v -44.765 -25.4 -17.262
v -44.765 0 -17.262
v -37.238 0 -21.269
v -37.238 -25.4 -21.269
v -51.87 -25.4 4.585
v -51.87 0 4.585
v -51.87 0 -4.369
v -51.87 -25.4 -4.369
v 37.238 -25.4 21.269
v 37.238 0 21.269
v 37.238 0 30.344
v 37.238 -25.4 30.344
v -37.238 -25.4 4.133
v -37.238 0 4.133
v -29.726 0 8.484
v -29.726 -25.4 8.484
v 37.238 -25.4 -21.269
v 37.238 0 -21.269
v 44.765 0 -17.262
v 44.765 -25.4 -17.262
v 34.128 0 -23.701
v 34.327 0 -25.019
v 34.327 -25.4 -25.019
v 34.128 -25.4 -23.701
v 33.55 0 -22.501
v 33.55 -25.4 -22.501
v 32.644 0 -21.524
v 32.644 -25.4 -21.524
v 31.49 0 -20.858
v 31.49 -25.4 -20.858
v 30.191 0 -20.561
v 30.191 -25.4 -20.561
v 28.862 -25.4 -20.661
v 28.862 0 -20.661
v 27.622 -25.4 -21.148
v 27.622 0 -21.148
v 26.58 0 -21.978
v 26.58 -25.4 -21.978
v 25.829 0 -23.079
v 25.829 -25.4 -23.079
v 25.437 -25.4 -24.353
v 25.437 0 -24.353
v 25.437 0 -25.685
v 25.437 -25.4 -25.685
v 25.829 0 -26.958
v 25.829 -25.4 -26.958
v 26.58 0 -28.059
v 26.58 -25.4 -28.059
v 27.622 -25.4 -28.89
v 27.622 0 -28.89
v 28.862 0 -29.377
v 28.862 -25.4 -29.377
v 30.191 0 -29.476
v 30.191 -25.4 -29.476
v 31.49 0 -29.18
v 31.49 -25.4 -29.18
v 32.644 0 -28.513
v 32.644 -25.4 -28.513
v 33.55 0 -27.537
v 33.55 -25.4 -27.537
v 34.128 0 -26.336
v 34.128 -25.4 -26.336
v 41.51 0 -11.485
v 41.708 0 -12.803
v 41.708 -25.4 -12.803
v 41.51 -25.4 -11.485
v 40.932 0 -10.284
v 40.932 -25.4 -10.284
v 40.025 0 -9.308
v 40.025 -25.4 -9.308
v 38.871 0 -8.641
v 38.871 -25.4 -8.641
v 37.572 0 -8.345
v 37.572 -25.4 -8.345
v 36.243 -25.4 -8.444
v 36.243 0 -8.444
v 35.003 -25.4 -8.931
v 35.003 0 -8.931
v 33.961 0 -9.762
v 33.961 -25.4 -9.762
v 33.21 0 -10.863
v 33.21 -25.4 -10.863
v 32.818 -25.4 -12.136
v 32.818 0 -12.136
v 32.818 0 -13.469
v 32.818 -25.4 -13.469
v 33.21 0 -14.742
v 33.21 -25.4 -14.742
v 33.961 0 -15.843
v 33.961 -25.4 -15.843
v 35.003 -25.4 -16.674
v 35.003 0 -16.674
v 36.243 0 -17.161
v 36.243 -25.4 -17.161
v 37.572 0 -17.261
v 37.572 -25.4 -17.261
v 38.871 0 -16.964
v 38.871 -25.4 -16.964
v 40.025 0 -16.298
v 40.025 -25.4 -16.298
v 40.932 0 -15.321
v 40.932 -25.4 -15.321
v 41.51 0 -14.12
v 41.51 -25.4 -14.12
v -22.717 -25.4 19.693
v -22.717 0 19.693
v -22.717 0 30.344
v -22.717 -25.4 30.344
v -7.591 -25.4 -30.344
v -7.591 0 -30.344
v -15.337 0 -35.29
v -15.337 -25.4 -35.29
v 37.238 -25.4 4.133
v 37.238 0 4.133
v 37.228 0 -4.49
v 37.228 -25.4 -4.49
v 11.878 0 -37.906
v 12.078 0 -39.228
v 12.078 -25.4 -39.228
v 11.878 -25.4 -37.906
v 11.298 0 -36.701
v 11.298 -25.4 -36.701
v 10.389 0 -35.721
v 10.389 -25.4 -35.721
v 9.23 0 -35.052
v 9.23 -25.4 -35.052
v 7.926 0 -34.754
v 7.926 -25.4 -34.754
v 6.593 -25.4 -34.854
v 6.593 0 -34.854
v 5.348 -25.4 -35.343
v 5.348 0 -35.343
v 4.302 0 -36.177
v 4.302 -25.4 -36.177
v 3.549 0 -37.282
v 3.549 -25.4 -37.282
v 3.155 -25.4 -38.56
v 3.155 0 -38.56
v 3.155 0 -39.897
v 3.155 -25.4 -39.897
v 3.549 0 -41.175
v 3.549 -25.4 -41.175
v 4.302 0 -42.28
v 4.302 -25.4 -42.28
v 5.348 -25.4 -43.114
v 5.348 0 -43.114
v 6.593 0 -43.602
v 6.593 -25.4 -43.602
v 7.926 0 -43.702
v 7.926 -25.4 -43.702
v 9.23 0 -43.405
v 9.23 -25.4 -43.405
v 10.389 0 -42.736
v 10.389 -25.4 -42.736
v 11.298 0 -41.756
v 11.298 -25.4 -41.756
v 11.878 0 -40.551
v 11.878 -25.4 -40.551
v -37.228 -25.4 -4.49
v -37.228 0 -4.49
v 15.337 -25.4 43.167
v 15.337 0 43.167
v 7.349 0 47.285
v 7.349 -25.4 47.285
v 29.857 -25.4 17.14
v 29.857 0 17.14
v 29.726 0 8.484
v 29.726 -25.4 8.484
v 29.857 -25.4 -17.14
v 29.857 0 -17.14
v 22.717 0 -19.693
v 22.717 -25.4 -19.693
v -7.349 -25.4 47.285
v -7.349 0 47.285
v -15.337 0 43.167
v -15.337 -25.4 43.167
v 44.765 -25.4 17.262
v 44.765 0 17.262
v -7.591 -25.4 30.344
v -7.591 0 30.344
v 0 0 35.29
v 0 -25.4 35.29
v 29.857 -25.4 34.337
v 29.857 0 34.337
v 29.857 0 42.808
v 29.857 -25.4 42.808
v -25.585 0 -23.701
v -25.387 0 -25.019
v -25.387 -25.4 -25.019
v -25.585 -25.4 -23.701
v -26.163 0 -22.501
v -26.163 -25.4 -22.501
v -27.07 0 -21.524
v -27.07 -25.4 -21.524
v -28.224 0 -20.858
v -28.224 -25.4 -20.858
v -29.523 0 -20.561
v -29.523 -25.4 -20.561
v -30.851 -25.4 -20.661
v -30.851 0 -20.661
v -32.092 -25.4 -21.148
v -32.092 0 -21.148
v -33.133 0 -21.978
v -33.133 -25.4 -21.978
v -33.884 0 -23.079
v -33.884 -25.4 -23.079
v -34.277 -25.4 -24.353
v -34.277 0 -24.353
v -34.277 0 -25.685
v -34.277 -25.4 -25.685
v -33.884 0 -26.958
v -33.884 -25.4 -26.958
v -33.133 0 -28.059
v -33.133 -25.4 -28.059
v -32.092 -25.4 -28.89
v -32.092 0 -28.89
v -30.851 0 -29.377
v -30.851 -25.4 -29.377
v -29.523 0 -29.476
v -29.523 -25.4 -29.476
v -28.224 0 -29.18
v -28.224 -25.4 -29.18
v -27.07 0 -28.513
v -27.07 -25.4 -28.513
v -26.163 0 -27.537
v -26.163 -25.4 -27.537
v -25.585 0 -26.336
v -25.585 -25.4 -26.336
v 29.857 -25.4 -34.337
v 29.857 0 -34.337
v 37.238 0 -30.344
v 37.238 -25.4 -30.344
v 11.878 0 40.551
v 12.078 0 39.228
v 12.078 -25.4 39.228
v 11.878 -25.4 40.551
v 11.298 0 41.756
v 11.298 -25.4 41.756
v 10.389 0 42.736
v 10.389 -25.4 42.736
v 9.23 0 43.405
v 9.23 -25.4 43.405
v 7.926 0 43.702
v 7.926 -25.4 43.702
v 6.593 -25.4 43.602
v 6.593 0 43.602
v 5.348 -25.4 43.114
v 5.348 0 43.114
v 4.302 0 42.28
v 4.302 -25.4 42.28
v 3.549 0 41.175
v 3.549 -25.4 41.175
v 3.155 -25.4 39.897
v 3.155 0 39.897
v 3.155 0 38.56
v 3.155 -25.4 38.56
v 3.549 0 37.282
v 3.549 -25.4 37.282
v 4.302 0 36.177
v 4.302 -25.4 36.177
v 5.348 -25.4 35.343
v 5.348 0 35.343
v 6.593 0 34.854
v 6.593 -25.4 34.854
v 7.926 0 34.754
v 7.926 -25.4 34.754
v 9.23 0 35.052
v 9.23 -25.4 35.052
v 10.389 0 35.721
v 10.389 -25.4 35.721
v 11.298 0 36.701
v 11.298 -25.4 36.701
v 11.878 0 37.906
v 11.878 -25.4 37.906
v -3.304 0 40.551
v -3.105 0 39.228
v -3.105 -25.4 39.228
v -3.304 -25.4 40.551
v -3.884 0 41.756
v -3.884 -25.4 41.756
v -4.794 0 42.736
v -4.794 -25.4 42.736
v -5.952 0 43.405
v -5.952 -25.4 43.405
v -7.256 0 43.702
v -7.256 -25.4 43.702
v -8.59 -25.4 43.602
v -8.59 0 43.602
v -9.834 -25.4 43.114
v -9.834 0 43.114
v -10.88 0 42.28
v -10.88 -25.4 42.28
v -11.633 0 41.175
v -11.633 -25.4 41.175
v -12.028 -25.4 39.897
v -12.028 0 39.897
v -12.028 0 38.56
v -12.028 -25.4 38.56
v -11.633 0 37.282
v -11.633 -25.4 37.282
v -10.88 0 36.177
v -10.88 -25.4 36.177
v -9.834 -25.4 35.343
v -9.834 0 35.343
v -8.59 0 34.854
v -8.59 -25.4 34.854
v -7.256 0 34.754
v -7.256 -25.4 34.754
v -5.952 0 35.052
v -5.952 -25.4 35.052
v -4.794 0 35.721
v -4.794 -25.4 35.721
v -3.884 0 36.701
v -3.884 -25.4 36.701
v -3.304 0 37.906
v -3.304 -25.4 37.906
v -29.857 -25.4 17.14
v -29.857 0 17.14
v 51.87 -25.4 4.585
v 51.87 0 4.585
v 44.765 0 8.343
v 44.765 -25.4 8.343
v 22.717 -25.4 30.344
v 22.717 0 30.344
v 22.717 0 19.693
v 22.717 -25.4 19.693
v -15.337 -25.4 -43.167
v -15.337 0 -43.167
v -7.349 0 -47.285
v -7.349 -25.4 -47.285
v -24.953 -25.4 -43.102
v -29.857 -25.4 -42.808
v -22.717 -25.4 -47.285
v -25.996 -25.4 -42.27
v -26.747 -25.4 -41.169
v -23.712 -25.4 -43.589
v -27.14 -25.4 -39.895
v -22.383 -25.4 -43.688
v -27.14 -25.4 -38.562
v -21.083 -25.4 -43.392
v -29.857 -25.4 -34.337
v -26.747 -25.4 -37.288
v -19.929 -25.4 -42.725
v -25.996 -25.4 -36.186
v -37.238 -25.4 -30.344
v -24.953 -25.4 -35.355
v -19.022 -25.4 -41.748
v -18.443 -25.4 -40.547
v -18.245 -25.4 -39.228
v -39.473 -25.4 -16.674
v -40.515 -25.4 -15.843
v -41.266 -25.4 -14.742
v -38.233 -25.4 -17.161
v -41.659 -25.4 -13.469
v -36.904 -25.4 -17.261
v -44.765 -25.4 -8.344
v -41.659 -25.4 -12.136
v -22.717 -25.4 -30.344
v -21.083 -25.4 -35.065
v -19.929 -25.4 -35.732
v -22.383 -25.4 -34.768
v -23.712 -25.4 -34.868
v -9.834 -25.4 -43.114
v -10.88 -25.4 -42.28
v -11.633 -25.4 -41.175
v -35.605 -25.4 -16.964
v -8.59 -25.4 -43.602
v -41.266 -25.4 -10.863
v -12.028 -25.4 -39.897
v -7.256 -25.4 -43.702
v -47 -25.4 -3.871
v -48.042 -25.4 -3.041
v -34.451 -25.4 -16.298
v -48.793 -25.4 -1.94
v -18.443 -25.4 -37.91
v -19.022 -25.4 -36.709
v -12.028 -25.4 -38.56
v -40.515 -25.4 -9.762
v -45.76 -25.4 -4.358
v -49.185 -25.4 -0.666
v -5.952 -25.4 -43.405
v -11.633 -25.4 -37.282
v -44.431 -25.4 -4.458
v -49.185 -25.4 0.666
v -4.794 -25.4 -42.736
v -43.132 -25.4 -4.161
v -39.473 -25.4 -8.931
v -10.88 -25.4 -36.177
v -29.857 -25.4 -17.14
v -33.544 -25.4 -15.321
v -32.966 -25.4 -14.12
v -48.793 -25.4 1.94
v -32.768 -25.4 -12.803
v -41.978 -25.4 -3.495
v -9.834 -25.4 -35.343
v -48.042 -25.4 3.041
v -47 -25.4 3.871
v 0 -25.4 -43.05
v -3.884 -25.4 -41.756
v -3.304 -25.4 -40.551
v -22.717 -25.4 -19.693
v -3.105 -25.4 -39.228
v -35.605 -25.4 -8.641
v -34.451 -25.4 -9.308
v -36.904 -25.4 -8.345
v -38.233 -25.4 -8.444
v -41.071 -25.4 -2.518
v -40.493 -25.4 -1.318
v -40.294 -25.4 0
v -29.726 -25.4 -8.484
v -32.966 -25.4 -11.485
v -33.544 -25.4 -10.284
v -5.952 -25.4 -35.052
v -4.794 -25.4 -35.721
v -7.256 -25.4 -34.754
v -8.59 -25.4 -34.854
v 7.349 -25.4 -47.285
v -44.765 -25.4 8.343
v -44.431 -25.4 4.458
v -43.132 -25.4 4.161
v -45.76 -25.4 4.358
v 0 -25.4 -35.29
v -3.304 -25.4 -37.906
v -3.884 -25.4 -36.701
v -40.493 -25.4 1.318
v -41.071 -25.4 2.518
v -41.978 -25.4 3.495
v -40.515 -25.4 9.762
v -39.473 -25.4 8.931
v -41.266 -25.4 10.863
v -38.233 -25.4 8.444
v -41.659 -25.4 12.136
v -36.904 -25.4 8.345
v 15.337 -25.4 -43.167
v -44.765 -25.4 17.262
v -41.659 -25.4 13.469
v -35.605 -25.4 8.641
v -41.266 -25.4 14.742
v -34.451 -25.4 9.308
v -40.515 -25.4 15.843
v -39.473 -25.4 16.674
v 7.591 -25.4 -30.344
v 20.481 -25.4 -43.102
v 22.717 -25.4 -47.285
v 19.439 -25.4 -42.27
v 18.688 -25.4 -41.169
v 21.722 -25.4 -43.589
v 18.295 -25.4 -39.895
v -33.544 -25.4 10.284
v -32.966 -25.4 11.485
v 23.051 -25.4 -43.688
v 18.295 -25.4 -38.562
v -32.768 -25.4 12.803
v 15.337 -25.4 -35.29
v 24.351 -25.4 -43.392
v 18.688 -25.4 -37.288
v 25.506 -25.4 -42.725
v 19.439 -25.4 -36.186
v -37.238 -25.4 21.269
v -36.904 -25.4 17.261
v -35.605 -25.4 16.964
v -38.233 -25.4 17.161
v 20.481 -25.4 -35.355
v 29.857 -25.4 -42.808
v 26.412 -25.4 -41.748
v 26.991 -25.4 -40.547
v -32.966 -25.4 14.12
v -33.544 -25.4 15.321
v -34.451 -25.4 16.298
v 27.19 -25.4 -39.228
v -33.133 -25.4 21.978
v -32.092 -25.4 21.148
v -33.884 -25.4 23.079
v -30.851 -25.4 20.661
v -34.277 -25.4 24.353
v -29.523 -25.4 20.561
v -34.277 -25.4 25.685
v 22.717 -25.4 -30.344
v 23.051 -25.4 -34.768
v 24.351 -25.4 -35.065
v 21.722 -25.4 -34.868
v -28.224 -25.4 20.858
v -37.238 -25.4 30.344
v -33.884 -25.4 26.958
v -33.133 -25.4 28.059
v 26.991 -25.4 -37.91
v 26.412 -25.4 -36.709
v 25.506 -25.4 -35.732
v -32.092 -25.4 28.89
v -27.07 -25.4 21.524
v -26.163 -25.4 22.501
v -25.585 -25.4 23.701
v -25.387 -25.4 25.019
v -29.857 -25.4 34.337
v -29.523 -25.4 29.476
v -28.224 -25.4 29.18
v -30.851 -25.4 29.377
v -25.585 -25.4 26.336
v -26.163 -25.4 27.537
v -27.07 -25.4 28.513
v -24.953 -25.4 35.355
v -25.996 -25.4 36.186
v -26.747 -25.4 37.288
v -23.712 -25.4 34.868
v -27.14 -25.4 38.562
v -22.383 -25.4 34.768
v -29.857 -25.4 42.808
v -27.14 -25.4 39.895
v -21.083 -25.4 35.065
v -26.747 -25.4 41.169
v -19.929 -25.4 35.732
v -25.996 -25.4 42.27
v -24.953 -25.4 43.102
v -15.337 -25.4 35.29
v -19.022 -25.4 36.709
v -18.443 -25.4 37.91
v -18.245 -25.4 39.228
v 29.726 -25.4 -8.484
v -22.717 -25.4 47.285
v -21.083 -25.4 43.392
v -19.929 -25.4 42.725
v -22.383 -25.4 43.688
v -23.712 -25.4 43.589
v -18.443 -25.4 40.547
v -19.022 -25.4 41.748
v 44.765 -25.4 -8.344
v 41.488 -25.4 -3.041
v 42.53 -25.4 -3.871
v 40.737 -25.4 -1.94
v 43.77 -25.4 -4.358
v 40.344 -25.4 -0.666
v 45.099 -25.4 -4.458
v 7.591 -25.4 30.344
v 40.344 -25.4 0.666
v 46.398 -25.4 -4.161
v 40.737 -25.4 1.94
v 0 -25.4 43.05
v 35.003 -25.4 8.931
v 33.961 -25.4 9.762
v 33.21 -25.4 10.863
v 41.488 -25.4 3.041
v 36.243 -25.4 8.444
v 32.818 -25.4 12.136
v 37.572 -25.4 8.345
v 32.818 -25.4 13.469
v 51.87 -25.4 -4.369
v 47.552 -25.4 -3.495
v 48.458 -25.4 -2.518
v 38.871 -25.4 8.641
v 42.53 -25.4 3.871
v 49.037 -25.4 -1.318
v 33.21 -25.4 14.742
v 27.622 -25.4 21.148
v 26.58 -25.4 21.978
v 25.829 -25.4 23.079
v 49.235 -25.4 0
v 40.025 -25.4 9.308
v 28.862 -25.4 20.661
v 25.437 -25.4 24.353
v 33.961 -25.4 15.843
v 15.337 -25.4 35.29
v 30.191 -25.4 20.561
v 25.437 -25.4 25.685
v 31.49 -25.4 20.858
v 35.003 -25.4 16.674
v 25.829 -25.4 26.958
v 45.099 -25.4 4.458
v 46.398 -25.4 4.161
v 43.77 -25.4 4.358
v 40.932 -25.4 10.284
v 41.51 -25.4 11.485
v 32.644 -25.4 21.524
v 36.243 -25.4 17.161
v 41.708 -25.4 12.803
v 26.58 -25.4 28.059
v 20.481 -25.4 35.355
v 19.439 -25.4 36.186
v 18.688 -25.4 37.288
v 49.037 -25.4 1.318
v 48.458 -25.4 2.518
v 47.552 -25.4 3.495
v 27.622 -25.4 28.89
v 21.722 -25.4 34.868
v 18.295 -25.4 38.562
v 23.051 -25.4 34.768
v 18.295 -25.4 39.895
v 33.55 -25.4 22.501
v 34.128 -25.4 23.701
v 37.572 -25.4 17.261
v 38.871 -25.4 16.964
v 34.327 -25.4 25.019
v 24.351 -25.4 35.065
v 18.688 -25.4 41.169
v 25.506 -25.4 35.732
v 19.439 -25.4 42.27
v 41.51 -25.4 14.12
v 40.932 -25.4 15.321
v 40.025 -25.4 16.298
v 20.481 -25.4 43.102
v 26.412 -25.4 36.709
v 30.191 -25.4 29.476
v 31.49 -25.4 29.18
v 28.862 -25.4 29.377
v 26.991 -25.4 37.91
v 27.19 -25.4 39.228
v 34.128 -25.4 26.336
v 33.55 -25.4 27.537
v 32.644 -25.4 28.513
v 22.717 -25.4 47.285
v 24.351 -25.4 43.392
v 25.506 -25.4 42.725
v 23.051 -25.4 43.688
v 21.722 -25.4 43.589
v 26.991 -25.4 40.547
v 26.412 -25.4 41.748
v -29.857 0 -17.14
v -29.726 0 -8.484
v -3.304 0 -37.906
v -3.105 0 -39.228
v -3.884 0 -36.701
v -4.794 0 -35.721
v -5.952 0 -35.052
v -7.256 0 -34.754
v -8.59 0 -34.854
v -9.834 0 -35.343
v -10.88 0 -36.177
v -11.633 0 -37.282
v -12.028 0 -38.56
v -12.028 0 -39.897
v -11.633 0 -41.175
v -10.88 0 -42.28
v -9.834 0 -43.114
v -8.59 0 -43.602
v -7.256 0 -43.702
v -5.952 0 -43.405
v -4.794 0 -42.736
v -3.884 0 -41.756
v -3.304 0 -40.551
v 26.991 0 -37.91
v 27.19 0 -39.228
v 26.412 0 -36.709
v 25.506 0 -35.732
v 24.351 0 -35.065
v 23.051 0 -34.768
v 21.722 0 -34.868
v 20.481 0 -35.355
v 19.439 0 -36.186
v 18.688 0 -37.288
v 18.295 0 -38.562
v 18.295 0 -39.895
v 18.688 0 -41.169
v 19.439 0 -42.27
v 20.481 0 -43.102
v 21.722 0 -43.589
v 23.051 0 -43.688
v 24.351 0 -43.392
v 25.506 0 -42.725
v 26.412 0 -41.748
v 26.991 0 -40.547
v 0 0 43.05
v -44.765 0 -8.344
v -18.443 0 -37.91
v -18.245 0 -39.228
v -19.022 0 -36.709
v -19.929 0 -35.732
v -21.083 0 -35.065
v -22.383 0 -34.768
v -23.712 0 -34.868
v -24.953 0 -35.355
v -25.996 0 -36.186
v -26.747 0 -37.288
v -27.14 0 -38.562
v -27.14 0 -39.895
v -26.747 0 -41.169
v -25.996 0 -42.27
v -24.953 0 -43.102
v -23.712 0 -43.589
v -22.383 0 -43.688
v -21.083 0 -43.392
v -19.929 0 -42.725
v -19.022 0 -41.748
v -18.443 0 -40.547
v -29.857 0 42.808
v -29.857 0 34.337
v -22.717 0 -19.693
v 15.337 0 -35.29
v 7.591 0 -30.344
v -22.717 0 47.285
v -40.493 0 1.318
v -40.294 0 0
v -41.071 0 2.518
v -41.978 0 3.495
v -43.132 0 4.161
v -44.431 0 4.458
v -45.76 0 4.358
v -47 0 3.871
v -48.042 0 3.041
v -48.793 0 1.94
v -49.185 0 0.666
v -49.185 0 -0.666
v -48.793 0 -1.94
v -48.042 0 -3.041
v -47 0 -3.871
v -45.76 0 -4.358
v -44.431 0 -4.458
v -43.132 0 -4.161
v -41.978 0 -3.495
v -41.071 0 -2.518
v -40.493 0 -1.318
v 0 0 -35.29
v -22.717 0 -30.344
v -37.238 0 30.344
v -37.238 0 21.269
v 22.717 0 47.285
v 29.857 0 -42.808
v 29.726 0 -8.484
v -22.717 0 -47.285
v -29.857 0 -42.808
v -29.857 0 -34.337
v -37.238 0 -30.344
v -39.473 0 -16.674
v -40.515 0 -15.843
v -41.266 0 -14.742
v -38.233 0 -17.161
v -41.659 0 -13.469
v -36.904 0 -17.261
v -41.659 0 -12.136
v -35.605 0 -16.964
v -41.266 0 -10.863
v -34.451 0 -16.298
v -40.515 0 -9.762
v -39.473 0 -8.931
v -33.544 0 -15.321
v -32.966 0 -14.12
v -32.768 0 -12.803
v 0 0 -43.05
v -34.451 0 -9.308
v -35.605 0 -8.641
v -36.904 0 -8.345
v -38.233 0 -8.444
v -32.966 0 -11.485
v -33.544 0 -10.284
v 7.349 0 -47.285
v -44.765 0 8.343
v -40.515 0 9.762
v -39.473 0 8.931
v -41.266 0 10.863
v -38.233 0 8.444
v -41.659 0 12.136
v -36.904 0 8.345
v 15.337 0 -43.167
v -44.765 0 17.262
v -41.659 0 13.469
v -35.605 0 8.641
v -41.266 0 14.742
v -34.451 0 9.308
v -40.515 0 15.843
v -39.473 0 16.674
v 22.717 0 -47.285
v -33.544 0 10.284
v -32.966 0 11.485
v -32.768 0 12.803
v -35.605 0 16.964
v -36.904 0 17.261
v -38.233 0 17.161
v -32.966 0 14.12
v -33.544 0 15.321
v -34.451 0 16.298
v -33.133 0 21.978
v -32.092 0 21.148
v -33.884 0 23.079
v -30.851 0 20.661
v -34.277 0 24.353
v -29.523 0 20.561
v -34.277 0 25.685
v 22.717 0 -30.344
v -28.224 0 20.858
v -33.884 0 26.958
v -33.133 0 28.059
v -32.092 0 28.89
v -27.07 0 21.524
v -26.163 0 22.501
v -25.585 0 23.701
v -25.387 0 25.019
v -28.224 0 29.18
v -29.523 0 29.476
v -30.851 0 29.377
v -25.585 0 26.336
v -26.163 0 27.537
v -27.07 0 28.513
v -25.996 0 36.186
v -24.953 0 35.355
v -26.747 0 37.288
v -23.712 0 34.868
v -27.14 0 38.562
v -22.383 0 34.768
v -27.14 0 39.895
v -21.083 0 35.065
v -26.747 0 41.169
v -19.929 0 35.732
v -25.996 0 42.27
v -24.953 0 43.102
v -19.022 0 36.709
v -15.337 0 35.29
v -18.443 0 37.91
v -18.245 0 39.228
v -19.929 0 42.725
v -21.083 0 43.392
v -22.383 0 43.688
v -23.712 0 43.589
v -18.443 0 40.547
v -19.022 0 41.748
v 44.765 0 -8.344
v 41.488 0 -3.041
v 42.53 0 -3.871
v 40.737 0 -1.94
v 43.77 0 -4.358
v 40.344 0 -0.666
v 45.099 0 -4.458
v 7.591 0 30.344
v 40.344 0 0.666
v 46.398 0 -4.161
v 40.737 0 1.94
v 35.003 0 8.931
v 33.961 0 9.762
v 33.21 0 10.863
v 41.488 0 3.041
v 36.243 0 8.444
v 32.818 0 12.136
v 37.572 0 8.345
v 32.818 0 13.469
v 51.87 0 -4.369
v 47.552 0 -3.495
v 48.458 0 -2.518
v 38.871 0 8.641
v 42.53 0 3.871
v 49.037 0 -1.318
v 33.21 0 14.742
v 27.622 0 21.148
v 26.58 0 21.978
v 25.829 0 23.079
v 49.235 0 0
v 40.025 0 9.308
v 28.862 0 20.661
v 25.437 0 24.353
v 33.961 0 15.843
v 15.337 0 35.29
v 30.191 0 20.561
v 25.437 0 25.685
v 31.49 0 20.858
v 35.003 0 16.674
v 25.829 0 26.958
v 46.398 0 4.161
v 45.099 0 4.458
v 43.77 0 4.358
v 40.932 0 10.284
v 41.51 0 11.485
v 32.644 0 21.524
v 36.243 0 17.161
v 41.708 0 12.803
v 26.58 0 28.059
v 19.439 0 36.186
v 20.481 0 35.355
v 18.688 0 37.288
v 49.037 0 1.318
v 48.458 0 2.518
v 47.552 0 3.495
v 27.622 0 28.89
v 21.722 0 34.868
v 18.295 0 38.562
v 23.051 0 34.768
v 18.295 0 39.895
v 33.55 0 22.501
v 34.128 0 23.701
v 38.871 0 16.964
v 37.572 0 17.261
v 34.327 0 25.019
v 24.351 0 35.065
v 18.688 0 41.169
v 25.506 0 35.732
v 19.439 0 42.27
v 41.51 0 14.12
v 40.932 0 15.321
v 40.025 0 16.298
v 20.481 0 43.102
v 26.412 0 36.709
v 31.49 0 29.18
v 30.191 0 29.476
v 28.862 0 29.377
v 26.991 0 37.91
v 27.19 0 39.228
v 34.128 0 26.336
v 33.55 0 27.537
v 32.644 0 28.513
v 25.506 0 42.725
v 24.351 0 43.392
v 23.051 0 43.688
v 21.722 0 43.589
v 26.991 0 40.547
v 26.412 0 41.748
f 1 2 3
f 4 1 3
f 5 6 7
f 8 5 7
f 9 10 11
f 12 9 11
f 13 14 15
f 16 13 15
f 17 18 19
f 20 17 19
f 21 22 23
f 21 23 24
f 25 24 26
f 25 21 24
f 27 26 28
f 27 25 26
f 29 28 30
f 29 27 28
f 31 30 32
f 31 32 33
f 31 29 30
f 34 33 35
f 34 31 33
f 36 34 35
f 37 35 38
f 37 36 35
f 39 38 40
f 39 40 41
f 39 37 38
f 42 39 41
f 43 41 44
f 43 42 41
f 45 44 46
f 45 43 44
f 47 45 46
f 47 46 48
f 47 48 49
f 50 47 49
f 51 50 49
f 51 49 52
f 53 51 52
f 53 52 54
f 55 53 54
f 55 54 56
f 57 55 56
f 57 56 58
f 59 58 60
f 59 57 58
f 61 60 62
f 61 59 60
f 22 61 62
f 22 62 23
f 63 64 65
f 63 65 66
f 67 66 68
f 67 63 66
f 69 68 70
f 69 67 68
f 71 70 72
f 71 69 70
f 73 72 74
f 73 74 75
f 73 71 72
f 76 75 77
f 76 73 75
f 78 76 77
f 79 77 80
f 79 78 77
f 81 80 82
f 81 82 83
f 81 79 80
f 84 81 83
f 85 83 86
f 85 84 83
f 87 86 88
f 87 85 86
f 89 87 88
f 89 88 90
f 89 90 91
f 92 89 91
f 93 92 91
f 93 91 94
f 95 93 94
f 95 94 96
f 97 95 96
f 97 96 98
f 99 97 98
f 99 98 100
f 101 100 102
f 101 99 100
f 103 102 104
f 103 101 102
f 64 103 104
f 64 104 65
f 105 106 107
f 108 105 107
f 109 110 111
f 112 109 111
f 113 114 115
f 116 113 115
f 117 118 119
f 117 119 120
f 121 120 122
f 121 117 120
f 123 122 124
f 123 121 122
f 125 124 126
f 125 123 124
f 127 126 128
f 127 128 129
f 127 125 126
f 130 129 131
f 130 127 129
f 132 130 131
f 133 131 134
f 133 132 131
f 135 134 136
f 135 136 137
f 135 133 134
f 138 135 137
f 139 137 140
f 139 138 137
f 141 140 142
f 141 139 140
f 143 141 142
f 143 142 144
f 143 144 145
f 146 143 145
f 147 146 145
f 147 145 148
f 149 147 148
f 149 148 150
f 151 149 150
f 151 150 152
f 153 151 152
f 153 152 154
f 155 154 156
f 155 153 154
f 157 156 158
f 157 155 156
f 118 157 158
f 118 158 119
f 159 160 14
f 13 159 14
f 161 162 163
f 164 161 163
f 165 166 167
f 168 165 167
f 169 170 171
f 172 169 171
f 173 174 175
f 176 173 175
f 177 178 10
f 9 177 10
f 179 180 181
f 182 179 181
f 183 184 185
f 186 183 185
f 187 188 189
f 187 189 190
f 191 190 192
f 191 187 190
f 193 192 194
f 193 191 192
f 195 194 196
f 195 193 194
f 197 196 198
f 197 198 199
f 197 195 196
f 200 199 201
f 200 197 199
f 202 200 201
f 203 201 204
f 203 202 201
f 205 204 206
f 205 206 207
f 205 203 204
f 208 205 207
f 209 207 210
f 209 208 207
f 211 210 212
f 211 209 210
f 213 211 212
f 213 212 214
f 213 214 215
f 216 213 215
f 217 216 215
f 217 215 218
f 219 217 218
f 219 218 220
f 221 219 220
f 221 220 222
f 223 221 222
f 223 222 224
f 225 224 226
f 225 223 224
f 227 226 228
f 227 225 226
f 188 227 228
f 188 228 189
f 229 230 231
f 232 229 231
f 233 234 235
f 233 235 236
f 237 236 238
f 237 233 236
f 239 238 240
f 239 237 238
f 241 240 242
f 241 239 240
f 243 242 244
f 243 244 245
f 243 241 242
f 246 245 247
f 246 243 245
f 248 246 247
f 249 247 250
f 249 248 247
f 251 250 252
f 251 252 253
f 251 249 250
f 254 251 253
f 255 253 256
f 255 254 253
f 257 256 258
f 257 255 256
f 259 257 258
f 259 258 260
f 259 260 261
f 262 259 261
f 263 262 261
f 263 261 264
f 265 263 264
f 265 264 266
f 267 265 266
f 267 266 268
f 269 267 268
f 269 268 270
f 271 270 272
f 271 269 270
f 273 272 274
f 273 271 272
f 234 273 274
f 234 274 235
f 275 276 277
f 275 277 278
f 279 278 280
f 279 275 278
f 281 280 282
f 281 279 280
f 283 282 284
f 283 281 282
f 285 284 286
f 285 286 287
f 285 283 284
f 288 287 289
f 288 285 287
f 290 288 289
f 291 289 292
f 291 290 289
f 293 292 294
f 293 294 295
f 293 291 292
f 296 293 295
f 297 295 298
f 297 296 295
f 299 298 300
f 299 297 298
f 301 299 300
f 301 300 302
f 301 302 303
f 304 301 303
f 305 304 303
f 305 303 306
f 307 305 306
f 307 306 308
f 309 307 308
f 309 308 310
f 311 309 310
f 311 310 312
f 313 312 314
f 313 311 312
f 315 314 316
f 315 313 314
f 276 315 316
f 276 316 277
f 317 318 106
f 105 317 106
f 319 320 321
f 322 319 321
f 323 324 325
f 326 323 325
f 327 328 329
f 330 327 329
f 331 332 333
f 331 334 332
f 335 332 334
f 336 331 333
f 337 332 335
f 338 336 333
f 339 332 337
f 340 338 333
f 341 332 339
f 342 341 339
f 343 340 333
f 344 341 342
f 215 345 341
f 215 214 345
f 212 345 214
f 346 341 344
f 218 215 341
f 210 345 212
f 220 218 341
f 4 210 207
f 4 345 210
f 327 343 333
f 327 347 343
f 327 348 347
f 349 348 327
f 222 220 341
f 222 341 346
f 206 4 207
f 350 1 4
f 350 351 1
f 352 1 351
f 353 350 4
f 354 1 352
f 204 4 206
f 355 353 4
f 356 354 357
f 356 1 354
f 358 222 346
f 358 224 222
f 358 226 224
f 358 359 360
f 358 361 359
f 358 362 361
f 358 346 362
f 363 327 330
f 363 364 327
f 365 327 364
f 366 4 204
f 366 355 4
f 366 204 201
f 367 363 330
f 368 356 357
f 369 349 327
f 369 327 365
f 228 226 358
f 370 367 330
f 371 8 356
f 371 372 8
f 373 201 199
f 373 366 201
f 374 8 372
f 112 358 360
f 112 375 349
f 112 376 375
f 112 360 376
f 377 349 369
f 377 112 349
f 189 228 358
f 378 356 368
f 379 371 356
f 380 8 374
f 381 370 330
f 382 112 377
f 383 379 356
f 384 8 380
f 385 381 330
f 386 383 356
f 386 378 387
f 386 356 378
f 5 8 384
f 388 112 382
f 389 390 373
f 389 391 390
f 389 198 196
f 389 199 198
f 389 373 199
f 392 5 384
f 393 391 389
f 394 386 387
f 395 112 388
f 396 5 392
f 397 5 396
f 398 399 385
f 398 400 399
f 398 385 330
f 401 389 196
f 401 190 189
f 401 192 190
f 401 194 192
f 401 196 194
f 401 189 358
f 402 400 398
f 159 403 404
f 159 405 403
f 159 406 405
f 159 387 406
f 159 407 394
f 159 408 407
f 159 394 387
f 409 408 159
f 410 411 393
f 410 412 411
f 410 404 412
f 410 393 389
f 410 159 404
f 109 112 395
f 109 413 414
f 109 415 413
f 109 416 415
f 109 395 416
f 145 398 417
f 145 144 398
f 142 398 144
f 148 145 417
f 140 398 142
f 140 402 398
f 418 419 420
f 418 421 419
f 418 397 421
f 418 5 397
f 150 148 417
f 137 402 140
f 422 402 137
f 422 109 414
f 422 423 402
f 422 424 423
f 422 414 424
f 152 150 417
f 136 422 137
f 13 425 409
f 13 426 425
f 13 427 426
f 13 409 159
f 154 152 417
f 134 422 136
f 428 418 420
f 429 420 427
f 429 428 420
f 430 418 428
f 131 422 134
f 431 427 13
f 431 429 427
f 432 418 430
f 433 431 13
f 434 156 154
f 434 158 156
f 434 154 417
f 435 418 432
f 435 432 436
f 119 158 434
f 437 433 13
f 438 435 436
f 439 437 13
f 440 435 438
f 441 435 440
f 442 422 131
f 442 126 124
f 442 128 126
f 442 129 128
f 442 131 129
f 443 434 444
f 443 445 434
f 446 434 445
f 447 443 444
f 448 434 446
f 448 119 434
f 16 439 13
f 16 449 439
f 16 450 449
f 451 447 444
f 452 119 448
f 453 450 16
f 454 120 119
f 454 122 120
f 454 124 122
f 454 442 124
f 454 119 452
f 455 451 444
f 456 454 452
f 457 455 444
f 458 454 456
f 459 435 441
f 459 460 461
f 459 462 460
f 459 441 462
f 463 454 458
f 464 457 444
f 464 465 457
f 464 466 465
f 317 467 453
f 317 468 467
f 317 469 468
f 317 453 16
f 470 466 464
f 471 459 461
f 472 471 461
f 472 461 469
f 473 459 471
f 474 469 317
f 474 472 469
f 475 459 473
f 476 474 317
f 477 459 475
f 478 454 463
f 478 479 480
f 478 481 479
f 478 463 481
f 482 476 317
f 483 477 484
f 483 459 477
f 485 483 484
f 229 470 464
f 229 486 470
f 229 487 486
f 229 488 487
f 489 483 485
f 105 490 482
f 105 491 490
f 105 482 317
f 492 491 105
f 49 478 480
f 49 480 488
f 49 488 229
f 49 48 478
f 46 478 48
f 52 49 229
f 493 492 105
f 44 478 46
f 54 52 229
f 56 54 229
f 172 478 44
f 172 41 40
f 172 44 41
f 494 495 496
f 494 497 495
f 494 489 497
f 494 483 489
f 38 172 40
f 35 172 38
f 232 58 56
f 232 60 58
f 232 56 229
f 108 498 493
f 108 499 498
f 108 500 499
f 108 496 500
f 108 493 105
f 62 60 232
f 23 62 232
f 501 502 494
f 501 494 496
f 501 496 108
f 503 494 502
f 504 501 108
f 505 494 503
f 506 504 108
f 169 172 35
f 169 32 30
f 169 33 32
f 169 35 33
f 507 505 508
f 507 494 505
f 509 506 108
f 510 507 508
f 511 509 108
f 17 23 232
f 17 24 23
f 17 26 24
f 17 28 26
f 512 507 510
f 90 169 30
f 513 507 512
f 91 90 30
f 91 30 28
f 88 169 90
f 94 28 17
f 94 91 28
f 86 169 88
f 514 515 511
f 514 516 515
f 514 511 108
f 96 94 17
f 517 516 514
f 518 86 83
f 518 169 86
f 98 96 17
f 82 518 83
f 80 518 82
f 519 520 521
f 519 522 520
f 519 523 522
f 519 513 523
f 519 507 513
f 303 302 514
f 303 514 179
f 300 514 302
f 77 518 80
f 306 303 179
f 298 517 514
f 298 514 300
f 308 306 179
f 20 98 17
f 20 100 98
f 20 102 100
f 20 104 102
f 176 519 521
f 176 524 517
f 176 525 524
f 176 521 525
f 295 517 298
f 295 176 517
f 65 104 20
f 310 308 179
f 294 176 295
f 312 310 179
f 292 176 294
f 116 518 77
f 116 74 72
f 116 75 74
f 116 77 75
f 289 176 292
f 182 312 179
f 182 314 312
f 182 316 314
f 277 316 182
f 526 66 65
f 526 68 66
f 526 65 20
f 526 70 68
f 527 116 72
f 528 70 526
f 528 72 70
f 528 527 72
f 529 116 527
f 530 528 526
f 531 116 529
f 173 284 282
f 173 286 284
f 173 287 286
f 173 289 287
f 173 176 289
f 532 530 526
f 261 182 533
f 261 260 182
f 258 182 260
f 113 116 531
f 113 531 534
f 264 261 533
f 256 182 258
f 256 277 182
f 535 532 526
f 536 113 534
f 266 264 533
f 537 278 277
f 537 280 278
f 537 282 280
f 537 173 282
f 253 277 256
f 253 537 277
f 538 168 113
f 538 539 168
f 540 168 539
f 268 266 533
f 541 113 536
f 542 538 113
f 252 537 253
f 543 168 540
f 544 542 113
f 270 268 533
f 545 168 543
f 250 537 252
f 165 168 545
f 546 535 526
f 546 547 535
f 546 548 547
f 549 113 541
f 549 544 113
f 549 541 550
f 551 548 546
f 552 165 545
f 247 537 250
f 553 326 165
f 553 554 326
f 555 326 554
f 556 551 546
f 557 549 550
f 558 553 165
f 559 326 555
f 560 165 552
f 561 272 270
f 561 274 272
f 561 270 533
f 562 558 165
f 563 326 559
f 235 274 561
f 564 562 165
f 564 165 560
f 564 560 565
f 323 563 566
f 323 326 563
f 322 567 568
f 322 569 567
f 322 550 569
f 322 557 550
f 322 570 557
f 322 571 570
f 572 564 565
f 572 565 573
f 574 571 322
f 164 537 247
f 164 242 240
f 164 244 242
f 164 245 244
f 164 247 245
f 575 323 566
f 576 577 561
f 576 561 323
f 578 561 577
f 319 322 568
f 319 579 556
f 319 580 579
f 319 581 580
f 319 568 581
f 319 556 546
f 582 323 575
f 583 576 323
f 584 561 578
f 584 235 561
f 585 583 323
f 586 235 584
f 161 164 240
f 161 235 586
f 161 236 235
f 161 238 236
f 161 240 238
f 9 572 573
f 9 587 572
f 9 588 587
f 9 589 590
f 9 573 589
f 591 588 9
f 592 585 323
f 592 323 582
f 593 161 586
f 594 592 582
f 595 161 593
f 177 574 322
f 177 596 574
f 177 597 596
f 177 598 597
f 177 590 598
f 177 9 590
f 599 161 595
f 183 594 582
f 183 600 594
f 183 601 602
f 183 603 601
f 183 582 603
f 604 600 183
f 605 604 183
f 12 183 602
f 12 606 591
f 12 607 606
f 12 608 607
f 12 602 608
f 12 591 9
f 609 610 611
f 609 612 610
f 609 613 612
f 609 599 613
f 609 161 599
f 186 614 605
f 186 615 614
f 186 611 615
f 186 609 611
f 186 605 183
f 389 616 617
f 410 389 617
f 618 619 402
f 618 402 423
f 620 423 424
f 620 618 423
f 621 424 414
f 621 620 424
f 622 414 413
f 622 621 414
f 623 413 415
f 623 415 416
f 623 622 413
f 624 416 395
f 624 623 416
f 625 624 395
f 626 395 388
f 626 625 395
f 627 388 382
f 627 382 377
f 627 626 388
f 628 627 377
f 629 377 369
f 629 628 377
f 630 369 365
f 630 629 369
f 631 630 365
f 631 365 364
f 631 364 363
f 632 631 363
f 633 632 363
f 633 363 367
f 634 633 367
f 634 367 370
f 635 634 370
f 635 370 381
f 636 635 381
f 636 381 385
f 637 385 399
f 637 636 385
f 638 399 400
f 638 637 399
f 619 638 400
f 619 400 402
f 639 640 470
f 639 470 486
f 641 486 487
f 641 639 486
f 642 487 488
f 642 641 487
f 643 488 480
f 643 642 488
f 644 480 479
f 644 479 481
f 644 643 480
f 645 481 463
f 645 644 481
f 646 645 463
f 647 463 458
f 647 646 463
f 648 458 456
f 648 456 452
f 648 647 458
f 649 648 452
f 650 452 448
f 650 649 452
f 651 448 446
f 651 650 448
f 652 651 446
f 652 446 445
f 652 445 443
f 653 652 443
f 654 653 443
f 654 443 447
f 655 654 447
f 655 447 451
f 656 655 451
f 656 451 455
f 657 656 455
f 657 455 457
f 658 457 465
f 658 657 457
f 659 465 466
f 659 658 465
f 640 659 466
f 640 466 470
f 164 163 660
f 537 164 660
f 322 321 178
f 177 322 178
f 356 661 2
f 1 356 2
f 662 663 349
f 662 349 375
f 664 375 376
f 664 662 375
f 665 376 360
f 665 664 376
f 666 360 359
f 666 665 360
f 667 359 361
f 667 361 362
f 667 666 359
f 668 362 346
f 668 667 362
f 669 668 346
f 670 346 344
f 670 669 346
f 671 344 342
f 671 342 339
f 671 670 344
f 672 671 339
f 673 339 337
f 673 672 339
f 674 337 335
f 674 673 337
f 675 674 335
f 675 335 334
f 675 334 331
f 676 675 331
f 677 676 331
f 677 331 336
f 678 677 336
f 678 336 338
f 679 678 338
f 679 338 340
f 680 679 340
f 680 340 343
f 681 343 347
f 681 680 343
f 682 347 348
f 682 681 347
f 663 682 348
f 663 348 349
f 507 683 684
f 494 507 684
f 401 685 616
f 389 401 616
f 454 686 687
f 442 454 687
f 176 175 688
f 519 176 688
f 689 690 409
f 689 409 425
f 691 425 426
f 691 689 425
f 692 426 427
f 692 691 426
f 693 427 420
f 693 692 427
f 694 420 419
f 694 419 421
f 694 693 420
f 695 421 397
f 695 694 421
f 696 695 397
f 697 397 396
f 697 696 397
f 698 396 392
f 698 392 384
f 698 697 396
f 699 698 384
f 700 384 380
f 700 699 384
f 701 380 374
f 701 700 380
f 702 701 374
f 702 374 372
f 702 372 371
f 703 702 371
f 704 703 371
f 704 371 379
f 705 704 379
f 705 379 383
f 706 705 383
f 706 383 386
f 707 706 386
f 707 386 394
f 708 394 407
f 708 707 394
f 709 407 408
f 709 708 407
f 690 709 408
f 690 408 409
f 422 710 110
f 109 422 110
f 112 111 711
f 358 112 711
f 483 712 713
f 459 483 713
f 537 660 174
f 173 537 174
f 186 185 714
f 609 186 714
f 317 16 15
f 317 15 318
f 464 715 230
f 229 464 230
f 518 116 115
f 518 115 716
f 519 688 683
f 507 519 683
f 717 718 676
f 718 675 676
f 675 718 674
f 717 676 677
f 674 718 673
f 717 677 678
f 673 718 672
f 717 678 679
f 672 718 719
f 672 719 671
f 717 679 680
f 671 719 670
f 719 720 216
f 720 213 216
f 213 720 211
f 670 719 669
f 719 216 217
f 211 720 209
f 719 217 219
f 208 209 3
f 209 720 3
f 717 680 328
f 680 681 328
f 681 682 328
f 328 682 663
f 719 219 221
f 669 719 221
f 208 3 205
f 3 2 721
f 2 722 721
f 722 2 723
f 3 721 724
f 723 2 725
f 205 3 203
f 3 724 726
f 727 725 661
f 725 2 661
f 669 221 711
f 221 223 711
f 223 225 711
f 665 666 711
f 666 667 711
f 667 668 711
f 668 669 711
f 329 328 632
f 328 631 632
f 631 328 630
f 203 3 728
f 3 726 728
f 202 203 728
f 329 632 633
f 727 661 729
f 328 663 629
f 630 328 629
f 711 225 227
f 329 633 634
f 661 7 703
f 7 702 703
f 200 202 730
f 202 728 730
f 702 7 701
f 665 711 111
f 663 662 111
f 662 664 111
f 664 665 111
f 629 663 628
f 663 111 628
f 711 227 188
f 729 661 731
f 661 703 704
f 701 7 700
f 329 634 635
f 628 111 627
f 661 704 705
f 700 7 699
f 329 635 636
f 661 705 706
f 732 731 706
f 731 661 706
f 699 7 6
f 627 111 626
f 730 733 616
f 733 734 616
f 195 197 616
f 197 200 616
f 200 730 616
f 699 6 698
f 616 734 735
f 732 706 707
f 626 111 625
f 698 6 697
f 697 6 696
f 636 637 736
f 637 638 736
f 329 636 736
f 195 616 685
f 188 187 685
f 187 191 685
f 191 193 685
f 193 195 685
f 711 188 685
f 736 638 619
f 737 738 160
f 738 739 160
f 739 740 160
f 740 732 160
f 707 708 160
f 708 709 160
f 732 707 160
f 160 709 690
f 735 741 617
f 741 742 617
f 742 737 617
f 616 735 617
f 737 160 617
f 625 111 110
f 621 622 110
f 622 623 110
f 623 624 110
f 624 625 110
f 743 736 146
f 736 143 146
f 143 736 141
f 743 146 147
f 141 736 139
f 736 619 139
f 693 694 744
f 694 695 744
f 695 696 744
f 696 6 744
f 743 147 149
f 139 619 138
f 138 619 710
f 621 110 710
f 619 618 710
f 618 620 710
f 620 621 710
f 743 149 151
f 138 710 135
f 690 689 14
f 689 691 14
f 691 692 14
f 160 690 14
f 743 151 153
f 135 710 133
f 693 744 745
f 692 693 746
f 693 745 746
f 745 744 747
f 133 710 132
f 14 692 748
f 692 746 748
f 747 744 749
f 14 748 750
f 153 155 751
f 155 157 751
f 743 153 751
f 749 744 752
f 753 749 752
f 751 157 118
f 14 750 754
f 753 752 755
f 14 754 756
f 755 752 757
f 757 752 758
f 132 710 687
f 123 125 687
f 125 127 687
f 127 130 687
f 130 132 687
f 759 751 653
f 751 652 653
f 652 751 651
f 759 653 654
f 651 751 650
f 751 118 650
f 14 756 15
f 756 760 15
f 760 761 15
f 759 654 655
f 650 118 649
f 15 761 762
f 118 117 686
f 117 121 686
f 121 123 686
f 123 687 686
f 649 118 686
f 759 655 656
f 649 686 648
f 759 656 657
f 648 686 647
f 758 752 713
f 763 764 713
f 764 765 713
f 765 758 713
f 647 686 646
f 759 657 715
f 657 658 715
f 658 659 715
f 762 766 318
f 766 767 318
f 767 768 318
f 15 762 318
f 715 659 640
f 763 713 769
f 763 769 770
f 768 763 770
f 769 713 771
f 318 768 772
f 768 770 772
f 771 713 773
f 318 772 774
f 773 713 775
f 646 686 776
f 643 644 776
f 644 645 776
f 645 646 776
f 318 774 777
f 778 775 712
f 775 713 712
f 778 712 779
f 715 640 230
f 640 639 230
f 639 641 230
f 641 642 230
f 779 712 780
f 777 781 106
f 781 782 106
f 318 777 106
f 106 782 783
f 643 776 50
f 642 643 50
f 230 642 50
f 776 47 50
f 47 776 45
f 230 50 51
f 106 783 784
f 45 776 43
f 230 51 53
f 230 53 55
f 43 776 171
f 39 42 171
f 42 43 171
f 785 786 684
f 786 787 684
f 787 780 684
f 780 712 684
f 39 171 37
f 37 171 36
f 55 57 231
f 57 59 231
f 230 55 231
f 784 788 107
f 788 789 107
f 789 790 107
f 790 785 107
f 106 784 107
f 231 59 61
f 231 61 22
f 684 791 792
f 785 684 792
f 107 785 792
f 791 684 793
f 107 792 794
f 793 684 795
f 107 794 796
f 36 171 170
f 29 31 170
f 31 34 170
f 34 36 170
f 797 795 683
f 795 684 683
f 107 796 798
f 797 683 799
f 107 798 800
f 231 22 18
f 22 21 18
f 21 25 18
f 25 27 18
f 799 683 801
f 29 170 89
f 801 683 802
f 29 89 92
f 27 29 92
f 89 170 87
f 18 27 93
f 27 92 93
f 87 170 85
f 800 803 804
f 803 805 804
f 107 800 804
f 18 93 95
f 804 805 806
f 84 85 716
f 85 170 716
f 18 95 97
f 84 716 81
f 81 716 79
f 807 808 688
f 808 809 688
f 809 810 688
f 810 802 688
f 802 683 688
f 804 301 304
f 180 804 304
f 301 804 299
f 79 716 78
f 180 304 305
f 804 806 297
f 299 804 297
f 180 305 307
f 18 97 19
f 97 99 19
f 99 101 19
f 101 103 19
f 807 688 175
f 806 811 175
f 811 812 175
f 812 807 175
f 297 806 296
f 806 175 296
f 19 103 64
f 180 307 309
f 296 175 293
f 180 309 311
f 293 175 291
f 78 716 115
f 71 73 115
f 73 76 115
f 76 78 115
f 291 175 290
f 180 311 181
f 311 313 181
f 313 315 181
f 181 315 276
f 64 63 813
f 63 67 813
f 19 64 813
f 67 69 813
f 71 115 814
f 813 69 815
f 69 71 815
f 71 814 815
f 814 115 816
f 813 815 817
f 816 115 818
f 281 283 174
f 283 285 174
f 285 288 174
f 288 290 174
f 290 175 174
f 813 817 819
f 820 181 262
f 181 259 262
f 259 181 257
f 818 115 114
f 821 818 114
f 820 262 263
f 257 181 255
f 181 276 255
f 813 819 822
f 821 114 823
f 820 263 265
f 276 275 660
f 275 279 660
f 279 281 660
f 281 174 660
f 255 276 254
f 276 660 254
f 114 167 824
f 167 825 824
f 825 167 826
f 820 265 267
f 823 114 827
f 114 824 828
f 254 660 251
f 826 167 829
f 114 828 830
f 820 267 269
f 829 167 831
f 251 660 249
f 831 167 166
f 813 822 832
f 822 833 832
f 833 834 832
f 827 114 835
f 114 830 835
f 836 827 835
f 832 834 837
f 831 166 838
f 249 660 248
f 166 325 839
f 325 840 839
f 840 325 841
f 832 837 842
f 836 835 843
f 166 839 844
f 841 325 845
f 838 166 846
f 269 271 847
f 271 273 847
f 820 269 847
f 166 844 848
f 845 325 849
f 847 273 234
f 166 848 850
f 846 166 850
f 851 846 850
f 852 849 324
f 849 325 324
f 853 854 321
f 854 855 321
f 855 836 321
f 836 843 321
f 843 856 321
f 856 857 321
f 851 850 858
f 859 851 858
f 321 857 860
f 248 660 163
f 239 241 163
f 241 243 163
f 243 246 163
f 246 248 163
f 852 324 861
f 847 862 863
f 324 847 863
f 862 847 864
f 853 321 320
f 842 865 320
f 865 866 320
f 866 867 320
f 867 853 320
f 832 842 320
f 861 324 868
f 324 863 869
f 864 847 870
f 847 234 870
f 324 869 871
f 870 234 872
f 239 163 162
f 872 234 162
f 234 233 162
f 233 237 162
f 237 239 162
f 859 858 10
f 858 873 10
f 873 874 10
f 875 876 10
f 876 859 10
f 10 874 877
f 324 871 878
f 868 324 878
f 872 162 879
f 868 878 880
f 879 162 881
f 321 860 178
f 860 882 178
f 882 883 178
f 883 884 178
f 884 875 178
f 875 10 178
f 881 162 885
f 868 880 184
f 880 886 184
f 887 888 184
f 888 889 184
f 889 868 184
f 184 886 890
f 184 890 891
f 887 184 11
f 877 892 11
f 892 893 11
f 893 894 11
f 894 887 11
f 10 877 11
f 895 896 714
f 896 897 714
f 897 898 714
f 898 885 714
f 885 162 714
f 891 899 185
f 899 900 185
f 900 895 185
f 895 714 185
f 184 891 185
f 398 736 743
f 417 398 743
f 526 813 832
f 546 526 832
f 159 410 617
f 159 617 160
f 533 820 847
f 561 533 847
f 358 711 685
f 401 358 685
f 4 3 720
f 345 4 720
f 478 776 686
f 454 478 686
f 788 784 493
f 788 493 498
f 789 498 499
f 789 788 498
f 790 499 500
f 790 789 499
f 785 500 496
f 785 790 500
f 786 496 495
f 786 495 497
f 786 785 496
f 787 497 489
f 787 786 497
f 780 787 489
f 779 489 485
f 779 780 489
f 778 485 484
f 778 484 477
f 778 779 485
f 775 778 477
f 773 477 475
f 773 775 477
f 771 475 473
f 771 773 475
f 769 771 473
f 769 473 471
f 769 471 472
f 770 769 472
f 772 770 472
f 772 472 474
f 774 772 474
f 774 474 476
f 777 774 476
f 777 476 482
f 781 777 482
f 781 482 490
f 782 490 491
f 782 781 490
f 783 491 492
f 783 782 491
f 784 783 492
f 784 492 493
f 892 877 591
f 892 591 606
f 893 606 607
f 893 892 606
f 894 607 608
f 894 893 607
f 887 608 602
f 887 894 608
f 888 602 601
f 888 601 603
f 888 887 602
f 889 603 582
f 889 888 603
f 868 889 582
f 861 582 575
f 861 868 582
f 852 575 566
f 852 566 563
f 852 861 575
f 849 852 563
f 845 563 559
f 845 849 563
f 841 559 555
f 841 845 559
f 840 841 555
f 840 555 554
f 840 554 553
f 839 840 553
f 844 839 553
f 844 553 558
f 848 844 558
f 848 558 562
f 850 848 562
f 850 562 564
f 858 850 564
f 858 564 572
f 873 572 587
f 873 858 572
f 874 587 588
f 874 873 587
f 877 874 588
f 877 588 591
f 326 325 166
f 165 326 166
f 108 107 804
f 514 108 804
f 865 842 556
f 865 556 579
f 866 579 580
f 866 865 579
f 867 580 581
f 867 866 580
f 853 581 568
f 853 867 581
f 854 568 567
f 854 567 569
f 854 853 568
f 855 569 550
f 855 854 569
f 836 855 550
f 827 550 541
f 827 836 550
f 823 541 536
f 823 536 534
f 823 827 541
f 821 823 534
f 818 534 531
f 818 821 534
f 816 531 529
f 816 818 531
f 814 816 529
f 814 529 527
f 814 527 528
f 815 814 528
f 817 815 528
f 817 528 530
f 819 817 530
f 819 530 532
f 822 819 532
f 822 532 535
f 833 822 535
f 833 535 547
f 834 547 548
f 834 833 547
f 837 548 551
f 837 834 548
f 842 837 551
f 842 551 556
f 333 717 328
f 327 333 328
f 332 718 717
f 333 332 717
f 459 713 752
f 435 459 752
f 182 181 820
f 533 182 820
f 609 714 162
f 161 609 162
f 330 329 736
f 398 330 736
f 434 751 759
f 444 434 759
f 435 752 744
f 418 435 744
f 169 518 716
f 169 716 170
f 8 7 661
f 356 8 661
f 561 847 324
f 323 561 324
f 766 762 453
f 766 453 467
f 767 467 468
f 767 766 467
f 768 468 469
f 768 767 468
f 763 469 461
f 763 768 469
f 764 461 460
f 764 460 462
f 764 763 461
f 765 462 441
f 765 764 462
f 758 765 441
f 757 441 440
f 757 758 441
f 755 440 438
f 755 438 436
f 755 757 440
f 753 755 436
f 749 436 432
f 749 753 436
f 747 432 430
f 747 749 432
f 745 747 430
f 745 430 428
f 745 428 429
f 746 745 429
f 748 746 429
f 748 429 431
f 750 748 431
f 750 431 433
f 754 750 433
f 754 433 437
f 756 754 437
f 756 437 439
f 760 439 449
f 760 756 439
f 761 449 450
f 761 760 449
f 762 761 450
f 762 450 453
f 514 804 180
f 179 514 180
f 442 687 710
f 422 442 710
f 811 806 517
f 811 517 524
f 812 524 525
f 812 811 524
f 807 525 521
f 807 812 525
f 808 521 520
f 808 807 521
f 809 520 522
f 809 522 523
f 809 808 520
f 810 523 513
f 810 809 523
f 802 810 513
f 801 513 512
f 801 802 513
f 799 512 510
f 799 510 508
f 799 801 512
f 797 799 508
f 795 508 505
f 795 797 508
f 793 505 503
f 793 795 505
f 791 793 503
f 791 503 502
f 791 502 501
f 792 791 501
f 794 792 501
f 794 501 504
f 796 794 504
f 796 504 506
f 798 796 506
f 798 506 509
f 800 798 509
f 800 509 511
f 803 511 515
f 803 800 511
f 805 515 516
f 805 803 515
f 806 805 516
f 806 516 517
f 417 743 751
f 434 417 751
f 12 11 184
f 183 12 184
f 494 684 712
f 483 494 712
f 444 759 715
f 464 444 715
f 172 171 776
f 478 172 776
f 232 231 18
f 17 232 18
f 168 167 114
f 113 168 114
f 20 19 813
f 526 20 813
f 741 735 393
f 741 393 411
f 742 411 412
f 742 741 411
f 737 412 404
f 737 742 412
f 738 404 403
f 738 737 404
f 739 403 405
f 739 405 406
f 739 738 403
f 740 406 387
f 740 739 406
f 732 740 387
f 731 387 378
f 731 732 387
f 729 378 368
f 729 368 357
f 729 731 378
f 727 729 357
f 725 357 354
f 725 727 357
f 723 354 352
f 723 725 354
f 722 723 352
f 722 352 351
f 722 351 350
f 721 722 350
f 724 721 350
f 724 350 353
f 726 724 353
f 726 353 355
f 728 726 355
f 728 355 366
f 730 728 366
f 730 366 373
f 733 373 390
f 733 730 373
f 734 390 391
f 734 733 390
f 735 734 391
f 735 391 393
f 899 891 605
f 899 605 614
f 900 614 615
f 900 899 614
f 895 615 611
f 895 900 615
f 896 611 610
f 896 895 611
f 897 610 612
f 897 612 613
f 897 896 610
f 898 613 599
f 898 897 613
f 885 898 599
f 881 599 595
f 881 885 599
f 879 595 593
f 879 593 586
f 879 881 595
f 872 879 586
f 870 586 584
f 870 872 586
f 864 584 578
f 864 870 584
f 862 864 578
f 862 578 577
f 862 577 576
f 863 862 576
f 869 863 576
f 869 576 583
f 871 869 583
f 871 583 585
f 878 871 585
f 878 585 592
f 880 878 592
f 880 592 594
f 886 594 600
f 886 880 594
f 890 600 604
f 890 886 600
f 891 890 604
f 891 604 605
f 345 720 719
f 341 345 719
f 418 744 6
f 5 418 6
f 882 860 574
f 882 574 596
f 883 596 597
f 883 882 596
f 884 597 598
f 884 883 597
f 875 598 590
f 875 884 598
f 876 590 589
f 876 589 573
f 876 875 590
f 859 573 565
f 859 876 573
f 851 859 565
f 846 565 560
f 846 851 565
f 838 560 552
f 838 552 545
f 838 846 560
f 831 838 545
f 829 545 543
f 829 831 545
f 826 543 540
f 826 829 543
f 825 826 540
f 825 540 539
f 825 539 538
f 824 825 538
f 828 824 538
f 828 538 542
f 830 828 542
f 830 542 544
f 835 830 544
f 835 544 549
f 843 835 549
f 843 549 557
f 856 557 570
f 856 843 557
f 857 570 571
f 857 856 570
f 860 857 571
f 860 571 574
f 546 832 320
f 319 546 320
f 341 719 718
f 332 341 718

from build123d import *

# Parameters (mm, degrees)
F0_R     = 4.4723953016
F0_R_2   = 4.4699433495
F0_R_3   = 4.4865038471
F0_R_4   = 4.4704
F1_DEPTH = 25.4


with BuildPart() as f1:
    # F0 (on Front) → F1 (new body)
    with BuildSketch(Plane.XZ):
        Polygon((-29.8565831035, 42.8078435361), (-29.8565831035, 34.337323159), (-22.7171443403, 30.3440783173), (-15.336762752, 35.2895531338), (-15.336762752, 43.1670817552), (-22.7171443403, 47.285117209), align=None)
        with Locations((-22.7171443403, 39.2283174445)):
            Circle(F0_R, mode=Mode.SUBTRACT)
        Polygon((-22.7171443403, 30.3440783173), (-29.8565831035, 34.337323159), (-37.238035351, 30.3440783173), (-37.238035351, 21.2685223682), (-29.8565831035, 17.1399140715), (-22.7171443403, 19.6934139464), align=None)
        with Locations((-29.8565831035, 25.0187461318)):
            Circle(F0_R_2, mode=Mode.SUBTRACT)
        Polygon((-15.336762752, 43.1670817552), (-15.336762752, 35.2895531338), (-7.5912186876, 30.3440783173), (0, 35.2895531338), (0, 43.0498570204), (-7.3492033407, 47.285117209), align=None)
        with Locations((-7.5912186876, 39.2283174445)):
            Circle(F0_R_3, mode=Mode.SUBTRACT)
        Polygon((-29.8565831035, 17.1399140715), (-37.238035351, 21.2685223682), (-44.7648577392, 17.2623099094), (-44.7648577392, 8.3431052044), (-37.238035351, 4.1331881966), (-29.7259818762, 8.483578451), align=None)
        with Locations((-37.238035351, 12.8027075569)):
            Circle(F0_R_4, mode=Mode.SUBTRACT)
        Polygon((0, 43.0498570204), (0, 35.2895531338), (7.5912186876, 30.3440783173), (15.336762752, 35.2895531338), (15.336762752, 43.1670817552), (7.3492033407, 47.285117209), align=None)
        with Locations((7.5912186876, 39.2283174445)):
            Circle(F0_R_3, mode=Mode.SUBTRACT)
        Polygon((-37.238035351, 4.1331881966), (-44.7648577392, 8.3431052044), (-51.8703386188, 4.5852214098), (-51.8703386188, -4.3693268672), (-44.7648577392, -8.343578319), (-37.2284390032, -4.4903345406), align=None)
        with Locations((-44.7648577392, 0)):
            Circle(F0_R_4, mode=Mode.SUBTRACT)
        Polygon((15.336762752, 43.1670817552), (15.336762752, 35.2895531338), (22.7171443403, 30.3440783173), (29.8565831035, 34.337323159), (29.8565831035, 42.8078435361), (22.7171443403, 47.285117209), align=None)
        with Locations((22.7171443403, 39.2283174445)):
            Circle(F0_R, mode=Mode.SUBTRACT)
        Polygon((-29.7259818762, -8.483578451), (-37.2284390032, -4.4903345406), (-44.7648577392, -8.343578319), (-44.7648577392, -17.2623099094), (-37.238035351, -21.2685223682), (-29.8565831035, -17.1399140715), align=None)
        with Locations((-37.238035351, -12.8027075569)):
            Circle(F0_R_4, mode=Mode.SUBTRACT)
        Polygon((29.8565831035, 34.337323159), (22.7171443403, 30.3440783173), (22.7171443403, 19.6934139464), (29.8565831035, 17.1399140715), (37.238035351, 21.2685223682), (37.238035351, 30.3440783173), align=None)
        with Locations((29.8565831035, 25.0187461318)):
            Circle(F0_R_2, mode=Mode.SUBTRACT)
        Polygon((-22.7171443403, -19.6934139464), (-29.8565831035, -17.1399140715), (-37.238035351, -21.2685223682), (-37.238035351, -30.3440783173), (-29.8565831035, -34.337323159), (-22.7171443403, -30.3440783173), align=None)
        with Locations((-29.8565831035, -25.0187461318)):
            Circle(F0_R_2, mode=Mode.SUBTRACT)
        Polygon((37.238035351, 21.2685223682), (29.8565831035, 17.1399140715), (29.7259818762, 8.483578451), (37.238035351, 4.1331881966), (44.7648577392, 8.3431052044), (44.7648577392, 17.2623099094), align=None)
        with Locations((37.238035351, 12.8027075569)):
            Circle(F0_R_4, mode=Mode.SUBTRACT)
        Polygon((-15.336762752, -35.2895531338), (-22.7171443403, -30.3440783173), (-29.8565831035, -34.337323159), (-29.8565831035, -42.8078435361), (-22.7171443403, -47.285117209), (-15.336762752, -43.1670817552), align=None)
        with Locations((-22.7171443403, -39.2283174445)):
            Circle(F0_R, mode=Mode.SUBTRACT)
        Polygon((0, -35.2895531338), (-7.5912186876, -30.3440783173), (-15.336762752, -35.2895531338), (-15.336762752, -43.1670817552), (-7.3492033407, -47.285117209), (0, -43.0498570204), align=None)
        with Locations((-7.5912186876, -39.2283174445)):
            Circle(F0_R_3, mode=Mode.SUBTRACT)
        Polygon((15.336762752, -35.2895531338), (7.5912186876, -30.3440783173), (0, -35.2895531338), (0, -43.0498570204), (7.3492033407, -47.285117209), (15.336762752, -43.1670817552), align=None)
        with Locations((7.5912186876, -39.2283174445)):
            Circle(F0_R_3, mode=Mode.SUBTRACT)
        Polygon((44.7648577392, 8.3431052044), (37.238035351, 4.1331881966), (37.2284390032, -4.4903345406), (44.7648577392, -8.343578319), (51.8703386188, -4.3693268672), (51.8703386188, 4.5852214098), align=None)
        with Locations((44.7648577392, 0)):
            Circle(F0_R_4, mode=Mode.SUBTRACT)
        Polygon((37.2284390032, -4.4903345406), (29.7259818762, -8.483578451), (29.8565831035, -17.1399140715), (37.238035351, -21.2685223682), (44.7648577392, -17.2623099094), (44.7648577392, -8.343578319), align=None)
        with Locations((37.238035351, -12.8027075569)):
            Circle(F0_R_4, mode=Mode.SUBTRACT)
        Polygon((29.8565831035, -17.1399140715), (22.7171443403, -19.6934139464), (22.7171443403, -30.3440783173), (29.8565831035, -34.337323159), (37.238035351, -30.3440783173), (37.238035351, -21.2685223682), align=None)
        with Locations((29.8565831035, -25.0187461318)):
            Circle(F0_R_2, mode=Mode.SUBTRACT)
        Polygon((22.7171443403, -30.3440783173), (15.336762752, -35.2895531338), (15.336762752, -43.1670817552), (22.7171443403, -47.285117209), (29.8565831035, -42.8078435361), (29.8565831035, -34.337323159), align=None)
        with Locations((22.7171443403, -39.2283174445)):
            Circle(F0_R, mode=Mode.SUBTRACT)
    extrude(amount=F1_DEPTH)


solid = f1.part
